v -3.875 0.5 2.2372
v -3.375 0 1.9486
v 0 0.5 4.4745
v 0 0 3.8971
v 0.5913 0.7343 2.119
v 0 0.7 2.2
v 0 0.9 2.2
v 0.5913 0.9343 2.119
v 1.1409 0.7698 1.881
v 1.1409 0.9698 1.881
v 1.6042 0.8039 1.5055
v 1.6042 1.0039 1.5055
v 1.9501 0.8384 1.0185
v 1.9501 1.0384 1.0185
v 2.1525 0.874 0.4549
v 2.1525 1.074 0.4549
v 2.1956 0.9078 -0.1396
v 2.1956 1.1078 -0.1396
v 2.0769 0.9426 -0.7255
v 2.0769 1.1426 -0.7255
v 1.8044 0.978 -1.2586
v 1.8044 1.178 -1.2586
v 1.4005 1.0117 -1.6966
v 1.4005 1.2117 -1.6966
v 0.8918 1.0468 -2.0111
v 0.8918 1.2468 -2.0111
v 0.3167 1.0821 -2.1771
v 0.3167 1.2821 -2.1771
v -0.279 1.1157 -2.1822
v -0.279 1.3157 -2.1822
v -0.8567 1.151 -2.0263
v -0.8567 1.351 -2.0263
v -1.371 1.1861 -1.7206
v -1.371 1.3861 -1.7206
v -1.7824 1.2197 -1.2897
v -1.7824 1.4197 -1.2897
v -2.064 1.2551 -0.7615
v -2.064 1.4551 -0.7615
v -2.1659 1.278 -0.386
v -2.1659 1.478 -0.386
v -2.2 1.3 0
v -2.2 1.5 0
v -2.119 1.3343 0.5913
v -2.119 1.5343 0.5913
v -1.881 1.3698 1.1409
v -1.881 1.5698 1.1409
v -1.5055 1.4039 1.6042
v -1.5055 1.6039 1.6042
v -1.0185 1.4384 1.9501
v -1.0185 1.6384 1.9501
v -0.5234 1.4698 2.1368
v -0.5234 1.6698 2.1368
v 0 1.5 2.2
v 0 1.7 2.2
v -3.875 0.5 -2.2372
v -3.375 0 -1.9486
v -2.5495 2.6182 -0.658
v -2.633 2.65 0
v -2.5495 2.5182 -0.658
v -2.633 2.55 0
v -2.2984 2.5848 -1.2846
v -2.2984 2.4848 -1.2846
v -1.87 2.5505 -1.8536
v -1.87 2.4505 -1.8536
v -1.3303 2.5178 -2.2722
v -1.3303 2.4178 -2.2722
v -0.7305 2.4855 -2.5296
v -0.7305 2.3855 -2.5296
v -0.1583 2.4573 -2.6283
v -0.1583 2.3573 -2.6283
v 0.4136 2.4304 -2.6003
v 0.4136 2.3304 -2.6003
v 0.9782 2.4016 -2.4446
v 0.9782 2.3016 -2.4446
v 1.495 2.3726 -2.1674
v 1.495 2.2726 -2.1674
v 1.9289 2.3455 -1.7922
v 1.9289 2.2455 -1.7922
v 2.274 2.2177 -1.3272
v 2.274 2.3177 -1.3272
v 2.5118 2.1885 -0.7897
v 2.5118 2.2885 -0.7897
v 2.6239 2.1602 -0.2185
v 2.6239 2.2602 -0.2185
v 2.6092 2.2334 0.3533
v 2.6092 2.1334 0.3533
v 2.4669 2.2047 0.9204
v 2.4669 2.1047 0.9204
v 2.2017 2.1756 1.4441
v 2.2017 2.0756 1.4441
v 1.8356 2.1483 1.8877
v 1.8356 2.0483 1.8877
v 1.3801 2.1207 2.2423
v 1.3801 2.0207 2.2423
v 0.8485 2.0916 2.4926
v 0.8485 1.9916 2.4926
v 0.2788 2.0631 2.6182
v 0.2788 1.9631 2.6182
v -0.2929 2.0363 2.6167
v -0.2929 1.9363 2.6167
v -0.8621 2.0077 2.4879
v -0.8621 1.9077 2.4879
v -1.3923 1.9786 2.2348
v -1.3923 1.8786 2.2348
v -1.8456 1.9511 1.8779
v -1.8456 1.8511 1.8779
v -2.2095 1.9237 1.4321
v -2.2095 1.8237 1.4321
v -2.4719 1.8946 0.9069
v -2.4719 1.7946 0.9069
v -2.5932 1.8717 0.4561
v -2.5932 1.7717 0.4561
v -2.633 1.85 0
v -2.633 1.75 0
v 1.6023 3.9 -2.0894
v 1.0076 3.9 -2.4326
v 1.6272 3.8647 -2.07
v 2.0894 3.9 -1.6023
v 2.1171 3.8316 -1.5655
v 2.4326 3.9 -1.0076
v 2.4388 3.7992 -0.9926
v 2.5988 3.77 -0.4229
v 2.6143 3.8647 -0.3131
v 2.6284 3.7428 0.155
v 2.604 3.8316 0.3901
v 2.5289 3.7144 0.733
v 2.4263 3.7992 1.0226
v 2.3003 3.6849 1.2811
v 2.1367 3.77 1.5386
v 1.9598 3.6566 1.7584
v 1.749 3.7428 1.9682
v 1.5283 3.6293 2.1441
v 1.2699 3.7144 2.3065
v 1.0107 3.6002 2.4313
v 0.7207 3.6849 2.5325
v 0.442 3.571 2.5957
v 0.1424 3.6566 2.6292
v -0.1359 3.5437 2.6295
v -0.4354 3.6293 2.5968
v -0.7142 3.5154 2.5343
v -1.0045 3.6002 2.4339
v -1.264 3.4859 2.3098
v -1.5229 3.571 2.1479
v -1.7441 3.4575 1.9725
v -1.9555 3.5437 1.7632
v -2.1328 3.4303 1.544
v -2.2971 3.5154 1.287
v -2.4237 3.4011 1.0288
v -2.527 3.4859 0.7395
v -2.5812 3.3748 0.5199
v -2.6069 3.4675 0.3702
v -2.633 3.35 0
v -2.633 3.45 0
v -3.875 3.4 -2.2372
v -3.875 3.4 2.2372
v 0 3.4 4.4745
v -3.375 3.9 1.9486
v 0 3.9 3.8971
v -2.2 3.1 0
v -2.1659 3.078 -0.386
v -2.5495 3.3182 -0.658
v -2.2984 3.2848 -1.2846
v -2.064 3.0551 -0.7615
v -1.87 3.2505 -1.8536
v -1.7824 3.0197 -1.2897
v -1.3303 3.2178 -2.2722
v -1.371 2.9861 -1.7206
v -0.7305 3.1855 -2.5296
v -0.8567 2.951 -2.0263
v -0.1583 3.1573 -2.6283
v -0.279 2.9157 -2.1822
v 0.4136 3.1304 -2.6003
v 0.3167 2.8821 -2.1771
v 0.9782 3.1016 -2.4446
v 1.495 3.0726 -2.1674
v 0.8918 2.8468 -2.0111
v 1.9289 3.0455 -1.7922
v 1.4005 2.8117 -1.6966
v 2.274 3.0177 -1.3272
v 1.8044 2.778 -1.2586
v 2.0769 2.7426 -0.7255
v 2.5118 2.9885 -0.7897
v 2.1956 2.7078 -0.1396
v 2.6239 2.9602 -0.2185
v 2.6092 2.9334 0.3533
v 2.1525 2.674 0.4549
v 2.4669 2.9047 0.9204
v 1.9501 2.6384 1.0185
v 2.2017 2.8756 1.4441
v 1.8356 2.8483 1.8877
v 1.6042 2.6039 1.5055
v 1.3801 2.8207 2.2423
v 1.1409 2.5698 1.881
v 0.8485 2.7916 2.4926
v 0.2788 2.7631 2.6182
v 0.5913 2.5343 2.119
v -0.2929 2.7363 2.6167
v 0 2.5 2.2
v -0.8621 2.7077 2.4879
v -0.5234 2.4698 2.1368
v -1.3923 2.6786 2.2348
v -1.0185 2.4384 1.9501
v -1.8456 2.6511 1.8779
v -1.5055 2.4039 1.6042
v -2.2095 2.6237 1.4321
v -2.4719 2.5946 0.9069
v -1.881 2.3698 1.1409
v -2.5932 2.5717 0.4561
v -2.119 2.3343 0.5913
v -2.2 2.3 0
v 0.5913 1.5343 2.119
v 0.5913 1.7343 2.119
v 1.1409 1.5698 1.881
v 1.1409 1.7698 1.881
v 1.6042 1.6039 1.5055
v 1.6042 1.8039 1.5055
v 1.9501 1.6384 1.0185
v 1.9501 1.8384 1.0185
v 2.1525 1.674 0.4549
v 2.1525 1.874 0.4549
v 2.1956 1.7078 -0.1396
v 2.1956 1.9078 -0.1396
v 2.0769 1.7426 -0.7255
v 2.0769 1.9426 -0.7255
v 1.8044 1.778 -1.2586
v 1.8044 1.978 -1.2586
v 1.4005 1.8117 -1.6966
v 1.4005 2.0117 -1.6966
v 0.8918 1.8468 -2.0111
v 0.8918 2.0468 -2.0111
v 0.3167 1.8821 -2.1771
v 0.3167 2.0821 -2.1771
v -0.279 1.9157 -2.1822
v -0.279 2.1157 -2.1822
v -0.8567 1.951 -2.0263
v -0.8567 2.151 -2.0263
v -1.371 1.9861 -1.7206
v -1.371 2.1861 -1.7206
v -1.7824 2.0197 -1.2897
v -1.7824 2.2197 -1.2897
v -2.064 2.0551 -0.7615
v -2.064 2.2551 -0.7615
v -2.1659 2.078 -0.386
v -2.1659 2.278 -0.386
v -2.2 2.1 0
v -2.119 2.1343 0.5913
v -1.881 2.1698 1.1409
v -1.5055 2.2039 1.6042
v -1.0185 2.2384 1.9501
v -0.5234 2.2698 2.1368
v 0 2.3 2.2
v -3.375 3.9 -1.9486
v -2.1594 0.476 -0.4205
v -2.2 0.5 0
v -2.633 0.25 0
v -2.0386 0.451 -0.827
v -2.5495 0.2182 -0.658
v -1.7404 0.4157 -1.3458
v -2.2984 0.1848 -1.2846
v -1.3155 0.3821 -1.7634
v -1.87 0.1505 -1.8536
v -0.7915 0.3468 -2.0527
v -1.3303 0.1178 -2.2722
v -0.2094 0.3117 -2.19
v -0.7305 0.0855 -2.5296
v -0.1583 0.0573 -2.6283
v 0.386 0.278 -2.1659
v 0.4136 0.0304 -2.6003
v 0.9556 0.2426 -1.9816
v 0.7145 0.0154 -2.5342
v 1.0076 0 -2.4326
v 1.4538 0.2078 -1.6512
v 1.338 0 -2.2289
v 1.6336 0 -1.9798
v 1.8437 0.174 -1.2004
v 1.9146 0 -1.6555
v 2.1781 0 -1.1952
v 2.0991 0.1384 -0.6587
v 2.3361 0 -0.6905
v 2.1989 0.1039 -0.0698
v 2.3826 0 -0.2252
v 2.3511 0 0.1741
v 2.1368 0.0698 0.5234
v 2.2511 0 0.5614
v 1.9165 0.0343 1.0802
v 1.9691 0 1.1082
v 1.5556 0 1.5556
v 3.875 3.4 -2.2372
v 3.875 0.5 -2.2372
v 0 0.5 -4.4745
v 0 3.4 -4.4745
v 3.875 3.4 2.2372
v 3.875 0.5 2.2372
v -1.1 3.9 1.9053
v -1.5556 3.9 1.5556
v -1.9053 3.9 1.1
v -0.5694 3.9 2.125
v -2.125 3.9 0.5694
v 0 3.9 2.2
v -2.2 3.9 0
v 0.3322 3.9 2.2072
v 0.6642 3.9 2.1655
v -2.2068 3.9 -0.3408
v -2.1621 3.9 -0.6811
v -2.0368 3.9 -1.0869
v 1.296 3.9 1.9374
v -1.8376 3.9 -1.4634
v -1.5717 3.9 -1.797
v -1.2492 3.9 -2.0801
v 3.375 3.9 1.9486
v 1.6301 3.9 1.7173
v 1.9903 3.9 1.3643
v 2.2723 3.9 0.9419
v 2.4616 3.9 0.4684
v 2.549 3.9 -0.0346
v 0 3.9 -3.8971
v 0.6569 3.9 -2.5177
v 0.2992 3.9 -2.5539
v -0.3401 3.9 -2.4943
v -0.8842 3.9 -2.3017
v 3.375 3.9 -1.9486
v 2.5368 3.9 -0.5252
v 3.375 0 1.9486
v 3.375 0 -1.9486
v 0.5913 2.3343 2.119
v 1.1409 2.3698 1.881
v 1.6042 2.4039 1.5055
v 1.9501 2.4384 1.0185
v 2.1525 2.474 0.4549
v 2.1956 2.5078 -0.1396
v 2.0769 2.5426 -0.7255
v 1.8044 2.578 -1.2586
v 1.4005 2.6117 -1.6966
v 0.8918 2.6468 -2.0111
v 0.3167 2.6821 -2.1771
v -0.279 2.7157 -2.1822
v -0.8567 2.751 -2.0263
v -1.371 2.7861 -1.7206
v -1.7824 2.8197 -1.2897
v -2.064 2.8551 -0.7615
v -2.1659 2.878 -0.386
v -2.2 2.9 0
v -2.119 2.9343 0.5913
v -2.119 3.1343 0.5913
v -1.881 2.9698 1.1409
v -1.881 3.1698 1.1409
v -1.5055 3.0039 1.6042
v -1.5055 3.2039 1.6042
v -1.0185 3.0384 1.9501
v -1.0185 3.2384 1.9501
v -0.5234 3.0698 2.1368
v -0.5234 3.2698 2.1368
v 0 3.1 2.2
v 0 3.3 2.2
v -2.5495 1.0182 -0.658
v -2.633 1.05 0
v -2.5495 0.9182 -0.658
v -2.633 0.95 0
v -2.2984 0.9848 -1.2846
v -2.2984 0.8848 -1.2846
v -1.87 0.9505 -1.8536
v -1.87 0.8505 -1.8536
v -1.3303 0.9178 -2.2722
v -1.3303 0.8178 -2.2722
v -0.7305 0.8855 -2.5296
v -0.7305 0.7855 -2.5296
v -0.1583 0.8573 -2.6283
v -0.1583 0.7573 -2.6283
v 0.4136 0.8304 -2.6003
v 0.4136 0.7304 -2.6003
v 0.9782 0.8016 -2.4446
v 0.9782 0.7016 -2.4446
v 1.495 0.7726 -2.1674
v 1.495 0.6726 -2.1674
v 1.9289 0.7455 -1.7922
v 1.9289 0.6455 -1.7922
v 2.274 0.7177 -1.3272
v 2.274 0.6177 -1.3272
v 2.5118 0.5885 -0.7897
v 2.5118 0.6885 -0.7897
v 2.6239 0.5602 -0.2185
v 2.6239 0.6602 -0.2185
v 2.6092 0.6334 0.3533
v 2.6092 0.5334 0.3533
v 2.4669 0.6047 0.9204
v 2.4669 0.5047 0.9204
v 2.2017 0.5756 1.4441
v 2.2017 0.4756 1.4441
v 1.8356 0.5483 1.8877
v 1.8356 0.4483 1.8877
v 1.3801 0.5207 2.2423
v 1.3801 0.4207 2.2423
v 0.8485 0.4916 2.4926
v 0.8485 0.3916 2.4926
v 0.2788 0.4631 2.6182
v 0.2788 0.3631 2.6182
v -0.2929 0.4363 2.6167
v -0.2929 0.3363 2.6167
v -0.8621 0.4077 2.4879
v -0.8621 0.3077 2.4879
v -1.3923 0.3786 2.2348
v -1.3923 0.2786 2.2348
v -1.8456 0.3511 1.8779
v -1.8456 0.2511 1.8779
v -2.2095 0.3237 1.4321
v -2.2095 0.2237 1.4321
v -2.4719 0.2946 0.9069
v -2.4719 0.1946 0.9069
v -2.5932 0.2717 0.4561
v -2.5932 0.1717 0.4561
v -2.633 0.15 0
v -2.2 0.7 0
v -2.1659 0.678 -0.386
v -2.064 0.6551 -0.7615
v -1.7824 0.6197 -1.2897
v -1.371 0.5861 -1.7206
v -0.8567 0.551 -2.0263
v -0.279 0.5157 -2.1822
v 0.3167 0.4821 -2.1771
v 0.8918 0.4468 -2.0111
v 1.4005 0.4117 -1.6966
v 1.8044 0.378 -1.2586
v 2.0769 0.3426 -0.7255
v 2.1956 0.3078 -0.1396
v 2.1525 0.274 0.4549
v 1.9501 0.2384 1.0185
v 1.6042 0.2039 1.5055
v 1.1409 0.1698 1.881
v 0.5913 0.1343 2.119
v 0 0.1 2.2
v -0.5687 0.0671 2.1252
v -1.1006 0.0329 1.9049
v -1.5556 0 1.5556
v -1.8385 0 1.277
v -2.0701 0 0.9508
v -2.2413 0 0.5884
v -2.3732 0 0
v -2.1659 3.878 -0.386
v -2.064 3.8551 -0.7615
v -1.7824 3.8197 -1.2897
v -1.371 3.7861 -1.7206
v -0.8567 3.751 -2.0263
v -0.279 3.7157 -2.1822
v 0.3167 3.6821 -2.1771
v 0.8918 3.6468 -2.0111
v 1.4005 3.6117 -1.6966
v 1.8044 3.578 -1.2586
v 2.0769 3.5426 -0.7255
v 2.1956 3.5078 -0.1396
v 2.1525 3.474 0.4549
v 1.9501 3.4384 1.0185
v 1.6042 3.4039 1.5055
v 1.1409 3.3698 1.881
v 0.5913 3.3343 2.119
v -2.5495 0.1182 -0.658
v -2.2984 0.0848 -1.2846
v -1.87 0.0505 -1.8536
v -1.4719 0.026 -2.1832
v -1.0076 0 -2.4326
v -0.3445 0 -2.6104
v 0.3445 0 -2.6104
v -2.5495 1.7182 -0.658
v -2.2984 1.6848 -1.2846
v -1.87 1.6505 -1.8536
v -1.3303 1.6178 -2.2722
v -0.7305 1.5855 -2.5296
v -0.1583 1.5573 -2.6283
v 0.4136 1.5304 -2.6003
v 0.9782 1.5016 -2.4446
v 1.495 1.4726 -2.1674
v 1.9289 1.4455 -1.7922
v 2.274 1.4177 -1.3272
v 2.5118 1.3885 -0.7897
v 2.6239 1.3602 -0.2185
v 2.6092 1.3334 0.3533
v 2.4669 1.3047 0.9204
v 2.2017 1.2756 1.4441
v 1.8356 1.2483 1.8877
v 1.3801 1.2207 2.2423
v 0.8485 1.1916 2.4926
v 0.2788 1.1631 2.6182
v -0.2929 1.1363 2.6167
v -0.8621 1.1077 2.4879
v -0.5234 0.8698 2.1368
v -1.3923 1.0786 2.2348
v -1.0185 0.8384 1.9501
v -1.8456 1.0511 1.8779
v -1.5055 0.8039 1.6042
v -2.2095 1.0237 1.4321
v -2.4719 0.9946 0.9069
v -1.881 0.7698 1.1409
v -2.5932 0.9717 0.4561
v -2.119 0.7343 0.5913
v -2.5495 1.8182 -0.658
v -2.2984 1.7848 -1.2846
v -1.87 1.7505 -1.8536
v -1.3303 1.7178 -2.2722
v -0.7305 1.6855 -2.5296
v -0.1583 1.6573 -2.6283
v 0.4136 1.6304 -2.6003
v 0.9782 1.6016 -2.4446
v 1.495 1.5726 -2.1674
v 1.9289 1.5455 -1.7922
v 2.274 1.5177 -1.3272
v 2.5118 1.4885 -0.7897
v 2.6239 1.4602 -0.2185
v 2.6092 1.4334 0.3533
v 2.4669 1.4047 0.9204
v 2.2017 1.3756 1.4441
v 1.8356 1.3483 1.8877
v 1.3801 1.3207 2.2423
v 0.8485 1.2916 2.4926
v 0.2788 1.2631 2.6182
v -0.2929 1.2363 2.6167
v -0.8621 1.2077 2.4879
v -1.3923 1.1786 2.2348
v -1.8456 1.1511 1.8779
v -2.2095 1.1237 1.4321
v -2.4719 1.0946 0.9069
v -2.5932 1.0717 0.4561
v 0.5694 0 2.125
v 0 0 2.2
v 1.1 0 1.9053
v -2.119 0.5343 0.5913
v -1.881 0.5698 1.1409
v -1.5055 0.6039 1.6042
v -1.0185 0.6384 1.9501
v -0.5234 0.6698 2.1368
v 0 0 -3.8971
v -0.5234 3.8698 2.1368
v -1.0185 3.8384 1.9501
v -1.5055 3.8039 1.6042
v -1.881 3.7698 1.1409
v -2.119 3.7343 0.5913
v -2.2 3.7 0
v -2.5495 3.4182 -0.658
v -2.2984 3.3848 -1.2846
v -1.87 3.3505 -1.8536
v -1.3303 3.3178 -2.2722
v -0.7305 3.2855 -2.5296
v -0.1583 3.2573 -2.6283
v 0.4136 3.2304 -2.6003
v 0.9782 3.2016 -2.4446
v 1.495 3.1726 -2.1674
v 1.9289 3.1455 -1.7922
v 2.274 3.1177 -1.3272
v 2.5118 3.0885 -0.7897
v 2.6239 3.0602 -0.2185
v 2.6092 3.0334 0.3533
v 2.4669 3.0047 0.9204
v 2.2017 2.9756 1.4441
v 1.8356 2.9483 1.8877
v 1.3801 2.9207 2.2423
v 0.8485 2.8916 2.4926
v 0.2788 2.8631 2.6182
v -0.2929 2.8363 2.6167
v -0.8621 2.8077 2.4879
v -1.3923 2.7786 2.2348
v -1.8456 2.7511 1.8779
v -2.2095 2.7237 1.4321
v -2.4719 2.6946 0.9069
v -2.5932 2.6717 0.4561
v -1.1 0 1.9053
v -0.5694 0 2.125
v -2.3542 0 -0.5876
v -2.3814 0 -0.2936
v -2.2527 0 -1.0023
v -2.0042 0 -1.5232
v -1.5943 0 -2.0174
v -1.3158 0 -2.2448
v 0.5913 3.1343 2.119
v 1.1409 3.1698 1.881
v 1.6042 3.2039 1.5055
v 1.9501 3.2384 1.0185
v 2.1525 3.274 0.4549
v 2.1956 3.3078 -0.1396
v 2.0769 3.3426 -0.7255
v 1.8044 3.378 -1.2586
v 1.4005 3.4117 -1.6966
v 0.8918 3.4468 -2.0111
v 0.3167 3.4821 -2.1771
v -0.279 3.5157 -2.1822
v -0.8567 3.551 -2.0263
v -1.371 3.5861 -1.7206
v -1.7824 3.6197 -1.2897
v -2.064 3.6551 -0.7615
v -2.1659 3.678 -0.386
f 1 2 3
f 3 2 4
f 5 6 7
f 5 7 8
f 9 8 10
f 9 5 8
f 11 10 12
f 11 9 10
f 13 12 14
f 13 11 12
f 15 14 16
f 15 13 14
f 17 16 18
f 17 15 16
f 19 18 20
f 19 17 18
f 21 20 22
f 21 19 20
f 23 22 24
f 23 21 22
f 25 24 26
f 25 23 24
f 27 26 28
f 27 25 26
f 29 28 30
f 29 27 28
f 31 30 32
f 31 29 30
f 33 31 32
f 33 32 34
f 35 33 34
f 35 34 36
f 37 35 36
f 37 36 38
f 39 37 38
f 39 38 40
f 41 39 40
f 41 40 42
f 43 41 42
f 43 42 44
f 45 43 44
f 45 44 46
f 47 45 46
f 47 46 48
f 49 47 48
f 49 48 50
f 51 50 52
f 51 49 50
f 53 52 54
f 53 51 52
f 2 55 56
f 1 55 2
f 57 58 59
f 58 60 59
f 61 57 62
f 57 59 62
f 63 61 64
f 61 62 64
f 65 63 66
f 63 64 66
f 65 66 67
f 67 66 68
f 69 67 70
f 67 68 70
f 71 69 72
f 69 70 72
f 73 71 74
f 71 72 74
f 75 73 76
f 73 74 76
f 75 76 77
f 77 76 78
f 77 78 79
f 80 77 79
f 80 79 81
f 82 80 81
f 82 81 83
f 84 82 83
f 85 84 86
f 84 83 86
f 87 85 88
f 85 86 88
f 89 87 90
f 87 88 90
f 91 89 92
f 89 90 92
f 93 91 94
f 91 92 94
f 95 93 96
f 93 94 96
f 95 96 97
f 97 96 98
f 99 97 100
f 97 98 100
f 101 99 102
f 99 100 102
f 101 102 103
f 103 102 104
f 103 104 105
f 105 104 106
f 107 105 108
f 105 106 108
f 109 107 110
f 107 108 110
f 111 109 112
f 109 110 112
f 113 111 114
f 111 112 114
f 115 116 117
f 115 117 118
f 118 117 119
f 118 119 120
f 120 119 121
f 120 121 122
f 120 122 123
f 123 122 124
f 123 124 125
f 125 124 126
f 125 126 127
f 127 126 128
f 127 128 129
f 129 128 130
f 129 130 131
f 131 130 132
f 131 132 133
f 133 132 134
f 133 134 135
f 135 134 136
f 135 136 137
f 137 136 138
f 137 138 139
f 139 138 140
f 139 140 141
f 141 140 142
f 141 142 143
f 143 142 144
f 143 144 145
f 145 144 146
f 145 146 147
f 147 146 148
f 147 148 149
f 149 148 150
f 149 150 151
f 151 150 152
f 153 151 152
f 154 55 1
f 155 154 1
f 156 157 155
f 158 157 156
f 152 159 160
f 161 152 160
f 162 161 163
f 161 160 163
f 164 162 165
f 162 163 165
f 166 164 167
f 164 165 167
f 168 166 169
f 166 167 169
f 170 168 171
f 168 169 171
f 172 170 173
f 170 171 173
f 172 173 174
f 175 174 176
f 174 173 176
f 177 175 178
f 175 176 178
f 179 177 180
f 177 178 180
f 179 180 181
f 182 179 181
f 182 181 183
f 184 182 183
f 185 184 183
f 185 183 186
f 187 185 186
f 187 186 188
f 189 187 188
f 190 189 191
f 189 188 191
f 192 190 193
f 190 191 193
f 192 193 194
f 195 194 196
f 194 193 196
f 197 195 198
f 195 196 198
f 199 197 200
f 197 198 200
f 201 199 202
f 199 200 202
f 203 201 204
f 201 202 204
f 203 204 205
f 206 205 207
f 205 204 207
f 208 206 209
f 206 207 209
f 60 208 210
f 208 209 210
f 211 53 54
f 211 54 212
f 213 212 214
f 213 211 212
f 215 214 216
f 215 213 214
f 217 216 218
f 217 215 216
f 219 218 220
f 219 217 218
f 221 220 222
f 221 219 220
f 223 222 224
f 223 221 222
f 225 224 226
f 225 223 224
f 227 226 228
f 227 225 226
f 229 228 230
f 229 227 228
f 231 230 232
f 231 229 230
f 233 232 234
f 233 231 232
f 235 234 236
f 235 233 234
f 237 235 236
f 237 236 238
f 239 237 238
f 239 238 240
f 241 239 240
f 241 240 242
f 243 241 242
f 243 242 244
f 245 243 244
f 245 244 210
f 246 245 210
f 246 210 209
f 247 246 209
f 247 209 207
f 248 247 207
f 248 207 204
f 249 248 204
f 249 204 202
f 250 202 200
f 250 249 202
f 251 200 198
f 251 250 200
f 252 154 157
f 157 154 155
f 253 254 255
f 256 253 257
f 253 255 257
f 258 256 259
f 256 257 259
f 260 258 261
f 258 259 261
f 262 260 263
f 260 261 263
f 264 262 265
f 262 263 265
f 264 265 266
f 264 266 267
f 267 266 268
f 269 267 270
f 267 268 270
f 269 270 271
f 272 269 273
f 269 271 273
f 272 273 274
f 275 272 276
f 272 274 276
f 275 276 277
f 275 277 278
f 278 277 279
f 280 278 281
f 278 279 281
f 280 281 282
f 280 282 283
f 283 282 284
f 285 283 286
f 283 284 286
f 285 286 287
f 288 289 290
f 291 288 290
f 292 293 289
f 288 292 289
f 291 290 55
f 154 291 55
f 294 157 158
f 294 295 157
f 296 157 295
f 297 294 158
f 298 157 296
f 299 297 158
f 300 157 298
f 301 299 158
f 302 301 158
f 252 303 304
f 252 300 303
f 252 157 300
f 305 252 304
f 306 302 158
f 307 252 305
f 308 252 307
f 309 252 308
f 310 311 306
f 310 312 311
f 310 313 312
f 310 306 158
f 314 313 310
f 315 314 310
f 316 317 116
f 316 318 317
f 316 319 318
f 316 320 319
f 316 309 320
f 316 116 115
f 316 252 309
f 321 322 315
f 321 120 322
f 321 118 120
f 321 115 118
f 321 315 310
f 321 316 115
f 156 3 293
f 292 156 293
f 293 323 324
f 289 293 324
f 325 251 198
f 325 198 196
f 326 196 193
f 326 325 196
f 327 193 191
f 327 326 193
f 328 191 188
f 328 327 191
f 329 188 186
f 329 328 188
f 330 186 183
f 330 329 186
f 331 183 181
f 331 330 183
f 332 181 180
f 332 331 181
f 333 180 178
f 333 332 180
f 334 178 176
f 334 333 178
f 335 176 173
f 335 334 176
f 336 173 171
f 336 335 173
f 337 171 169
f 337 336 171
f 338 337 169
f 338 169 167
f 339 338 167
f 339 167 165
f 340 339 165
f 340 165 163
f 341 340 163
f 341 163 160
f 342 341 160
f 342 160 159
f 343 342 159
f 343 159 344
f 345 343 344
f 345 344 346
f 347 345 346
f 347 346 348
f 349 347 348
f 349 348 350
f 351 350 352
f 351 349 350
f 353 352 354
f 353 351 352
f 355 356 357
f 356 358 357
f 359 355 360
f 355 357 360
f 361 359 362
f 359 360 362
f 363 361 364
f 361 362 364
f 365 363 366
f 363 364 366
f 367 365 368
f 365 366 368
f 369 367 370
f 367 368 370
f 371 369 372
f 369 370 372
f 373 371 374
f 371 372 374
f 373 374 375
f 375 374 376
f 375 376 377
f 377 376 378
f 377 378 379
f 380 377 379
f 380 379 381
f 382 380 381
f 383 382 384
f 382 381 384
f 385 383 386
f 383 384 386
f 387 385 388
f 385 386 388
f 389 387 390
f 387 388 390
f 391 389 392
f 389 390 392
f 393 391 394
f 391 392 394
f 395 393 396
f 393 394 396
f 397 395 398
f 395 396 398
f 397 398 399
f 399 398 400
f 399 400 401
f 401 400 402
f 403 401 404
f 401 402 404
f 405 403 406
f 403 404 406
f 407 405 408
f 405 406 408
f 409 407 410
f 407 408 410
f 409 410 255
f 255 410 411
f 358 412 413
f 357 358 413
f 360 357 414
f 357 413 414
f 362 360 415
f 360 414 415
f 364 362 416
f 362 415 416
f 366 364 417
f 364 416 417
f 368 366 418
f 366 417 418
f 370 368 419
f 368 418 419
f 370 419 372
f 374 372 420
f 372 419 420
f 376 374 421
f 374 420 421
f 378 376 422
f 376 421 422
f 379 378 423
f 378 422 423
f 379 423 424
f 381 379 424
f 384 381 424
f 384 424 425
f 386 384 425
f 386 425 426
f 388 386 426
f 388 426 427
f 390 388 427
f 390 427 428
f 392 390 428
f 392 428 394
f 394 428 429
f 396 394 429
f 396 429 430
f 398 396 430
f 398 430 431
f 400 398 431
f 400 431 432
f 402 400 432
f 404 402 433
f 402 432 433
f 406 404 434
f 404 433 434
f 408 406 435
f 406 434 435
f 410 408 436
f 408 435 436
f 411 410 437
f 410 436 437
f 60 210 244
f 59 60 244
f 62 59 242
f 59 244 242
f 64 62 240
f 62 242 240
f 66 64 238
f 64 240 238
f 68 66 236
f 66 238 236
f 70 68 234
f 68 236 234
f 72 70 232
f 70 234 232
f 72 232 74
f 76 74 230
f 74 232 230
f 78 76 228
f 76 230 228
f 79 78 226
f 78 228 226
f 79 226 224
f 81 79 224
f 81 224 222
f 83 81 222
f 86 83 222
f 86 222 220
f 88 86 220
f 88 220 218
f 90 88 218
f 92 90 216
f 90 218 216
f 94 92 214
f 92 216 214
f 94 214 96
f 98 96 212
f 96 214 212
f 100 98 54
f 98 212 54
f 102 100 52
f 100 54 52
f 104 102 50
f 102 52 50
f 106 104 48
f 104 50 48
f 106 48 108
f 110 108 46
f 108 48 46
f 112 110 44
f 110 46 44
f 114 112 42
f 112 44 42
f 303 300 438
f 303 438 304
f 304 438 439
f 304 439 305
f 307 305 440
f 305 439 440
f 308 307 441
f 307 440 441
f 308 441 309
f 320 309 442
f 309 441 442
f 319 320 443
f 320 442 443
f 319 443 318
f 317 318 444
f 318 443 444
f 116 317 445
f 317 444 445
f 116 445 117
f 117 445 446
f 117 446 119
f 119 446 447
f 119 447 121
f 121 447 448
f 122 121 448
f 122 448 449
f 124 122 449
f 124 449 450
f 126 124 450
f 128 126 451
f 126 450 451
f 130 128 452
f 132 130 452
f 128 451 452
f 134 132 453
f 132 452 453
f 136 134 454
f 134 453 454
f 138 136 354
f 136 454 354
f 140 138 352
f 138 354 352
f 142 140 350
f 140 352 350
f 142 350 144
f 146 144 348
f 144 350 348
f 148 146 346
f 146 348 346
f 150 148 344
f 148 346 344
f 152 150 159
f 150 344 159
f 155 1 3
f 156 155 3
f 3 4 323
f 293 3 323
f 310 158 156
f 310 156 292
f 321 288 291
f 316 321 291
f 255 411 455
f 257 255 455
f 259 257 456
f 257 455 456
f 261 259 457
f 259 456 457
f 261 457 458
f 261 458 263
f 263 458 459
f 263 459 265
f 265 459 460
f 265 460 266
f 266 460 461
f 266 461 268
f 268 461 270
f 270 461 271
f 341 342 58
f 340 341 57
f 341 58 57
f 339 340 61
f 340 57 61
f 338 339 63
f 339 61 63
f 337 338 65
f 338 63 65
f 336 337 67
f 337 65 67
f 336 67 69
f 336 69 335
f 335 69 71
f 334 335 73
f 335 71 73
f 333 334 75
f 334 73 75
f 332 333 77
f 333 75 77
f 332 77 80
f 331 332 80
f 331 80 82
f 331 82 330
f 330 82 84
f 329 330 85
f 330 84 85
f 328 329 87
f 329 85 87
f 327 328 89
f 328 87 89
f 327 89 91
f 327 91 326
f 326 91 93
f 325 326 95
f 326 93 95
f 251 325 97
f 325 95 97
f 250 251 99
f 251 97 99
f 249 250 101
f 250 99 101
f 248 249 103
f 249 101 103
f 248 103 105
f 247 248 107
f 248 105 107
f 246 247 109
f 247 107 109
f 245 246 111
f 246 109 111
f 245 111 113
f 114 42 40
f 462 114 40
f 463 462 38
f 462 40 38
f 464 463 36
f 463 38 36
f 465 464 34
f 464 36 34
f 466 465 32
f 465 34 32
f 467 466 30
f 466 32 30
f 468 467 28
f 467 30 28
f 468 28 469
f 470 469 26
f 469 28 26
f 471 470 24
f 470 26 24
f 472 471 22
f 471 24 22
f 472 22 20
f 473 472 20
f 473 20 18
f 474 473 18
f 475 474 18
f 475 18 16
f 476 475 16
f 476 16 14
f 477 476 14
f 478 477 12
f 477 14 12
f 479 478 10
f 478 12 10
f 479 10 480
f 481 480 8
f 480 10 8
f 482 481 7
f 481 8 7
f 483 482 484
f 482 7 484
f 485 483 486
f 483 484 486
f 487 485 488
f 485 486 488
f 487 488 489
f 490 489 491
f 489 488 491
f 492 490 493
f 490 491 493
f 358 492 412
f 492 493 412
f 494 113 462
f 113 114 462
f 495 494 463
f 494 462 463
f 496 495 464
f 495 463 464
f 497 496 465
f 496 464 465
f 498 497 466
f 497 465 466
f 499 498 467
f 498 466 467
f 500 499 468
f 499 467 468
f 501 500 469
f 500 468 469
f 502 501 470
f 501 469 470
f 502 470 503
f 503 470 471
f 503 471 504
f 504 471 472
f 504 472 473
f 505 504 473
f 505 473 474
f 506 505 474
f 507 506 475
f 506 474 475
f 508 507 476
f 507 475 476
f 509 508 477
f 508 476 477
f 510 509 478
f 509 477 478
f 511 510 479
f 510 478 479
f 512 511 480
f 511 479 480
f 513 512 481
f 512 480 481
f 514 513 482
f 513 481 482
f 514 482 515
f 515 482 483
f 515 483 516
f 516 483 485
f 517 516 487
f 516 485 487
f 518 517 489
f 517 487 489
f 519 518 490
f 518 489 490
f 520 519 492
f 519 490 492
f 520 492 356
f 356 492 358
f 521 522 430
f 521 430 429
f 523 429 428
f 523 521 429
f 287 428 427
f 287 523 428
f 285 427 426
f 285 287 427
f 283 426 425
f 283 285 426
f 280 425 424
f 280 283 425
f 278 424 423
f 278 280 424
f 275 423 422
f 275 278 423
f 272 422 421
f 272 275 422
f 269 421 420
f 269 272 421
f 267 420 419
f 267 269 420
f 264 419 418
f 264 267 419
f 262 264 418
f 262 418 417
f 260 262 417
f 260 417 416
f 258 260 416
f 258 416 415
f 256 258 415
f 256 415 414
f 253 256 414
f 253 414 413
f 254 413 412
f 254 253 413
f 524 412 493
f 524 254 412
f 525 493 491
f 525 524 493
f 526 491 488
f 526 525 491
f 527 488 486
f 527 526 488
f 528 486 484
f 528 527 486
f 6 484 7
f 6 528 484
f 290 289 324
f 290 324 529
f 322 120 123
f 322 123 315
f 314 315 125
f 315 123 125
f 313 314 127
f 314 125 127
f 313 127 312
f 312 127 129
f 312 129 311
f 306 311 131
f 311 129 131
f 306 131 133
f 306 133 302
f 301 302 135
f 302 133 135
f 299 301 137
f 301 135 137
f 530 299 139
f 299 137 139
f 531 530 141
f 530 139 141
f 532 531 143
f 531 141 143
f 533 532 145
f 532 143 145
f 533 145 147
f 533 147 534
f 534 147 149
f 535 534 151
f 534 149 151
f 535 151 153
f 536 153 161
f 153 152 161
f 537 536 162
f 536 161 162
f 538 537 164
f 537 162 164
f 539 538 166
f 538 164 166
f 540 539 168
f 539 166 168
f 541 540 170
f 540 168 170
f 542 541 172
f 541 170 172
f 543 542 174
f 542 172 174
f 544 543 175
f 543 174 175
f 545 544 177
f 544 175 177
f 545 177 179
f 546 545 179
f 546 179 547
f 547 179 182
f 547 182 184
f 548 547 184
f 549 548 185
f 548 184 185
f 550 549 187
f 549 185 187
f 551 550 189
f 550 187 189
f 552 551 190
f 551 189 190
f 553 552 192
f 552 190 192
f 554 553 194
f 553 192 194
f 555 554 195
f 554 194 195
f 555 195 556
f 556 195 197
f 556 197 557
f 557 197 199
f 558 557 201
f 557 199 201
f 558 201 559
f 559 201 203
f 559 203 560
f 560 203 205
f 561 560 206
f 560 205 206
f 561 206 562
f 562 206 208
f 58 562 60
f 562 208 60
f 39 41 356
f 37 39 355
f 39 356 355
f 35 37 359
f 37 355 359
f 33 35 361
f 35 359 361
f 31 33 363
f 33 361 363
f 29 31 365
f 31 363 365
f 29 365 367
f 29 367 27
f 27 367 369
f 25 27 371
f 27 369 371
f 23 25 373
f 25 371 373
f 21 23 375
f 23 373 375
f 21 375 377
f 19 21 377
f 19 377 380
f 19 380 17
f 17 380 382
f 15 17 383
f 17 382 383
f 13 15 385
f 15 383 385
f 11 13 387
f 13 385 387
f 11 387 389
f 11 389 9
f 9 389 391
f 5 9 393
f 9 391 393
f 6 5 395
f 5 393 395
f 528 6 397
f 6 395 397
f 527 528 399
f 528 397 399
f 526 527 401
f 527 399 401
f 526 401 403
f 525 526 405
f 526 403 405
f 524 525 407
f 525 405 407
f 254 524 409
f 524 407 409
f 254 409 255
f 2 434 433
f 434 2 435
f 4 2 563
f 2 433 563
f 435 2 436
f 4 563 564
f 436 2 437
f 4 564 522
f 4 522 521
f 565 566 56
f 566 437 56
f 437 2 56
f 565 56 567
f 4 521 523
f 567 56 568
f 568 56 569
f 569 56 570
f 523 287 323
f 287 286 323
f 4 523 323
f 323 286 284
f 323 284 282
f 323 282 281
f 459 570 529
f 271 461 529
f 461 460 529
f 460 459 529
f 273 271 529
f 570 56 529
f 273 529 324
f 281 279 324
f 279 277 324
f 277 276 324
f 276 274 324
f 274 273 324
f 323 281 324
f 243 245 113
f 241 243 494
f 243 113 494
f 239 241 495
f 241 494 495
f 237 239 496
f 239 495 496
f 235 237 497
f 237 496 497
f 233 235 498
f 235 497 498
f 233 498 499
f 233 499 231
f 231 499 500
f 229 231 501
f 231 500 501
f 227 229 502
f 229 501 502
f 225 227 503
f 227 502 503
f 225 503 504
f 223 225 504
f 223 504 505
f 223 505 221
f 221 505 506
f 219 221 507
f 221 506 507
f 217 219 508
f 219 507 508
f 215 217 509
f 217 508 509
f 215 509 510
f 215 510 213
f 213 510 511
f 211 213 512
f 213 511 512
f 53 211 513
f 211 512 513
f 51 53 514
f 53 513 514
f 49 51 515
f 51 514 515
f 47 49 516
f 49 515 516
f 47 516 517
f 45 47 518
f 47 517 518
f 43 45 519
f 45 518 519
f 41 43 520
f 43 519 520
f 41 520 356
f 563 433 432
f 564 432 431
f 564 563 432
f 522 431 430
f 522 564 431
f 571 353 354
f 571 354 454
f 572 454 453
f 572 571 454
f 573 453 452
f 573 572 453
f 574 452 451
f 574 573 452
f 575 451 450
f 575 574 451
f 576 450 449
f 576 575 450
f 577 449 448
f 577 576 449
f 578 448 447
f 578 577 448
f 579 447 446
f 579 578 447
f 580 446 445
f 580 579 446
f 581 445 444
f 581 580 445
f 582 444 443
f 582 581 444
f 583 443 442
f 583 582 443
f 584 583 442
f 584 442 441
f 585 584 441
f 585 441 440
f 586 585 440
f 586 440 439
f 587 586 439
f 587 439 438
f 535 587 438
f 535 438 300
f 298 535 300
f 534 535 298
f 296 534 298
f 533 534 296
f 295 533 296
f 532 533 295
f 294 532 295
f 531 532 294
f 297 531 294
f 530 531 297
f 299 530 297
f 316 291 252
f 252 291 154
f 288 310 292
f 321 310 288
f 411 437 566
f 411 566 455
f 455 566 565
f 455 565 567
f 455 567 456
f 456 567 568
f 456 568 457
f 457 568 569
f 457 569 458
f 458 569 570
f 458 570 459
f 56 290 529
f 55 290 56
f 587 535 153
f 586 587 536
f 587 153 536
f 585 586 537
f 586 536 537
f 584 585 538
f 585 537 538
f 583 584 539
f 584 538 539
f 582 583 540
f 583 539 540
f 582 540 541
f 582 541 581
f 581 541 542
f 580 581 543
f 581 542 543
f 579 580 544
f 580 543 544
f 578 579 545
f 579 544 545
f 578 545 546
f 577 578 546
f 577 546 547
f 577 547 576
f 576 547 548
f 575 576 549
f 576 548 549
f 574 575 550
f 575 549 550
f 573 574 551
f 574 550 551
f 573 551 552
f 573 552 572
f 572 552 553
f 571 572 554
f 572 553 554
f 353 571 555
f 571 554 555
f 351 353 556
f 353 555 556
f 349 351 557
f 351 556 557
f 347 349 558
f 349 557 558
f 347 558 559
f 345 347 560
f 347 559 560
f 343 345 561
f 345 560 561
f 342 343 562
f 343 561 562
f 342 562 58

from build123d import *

# Parameters (mm, degrees)
SKETCH1_R           = 2.2
BOSS_EXTRUDE1_DEPTH = 3.9
THREAD1_PITCH       = 0.8
CHAMFER1_SIZE       = 0.5


with BuildPart() as part:
    # Sketch1 → Boss-Extrude1 (new body)
    with BuildSketch(Plane(origin=(0, 0, 0), x_dir=(1, 0, 0), z_dir=(0, 1, 0))):
        Polygon((0, -4.474464586), (3.875, -2.237232293), (3.875, 2.237232293), (0, 4.474464586), (-3.875, 2.237232293), (-3.875, -2.237232293), align=None)
        with Locations(Location((0, 0, 0), (0, 0, 270))):
            Circle(SKETCH1_R, mode=Mode.SUBTRACT)
    extrude(amount=BOSS_EXTRUDE1_DEPTH)

    # Thread1: the profile of Thread Profile1 profile screwed along a right-hand helix of 5.625 turns, 8 arcs to a turn; built about Z, then put on its axis
    thread1_z = Axis((0, 0, 0), (0, 0, 1))
    thread1_corners = [(2.1997, 0, -0.000173205), (2.6330127, 0, 0.249999999), (2.6330127, 0, 0.349999999), (2.1997, 0, 0.600173203)]
    with BuildLine(mode=Mode.PRIVATE) as thread1_profile:
        Line(thread1_corners[0], thread1_corners[1])
        Line(thread1_corners[1], thread1_corners[2])
        Line(thread1_corners[2], thread1_corners[3])
        Line(thread1_corners[3], thread1_corners[0])
    thread1_cap = Face(thread1_profile.wire())
    thread1_turn_angles = [0, 22.5, 45, 67.5, 90, 112.5, 135, 157.5, 180, 202.5, 225, 247.5, 270, 292.5, 315, 337.5, 360]
    thread1_turn_weights = [1, 0.9238795325112867, 1, 0.9238795325112867, 1, 0.9238795325112867, 1, 0.9238795325112867, 1, 0.9238795325112867, 1, 0.9238795325112867, 1, 0.9238795325112867, 1, 0.9238795325112867, 1]
    thread1_turn_rails = [Edge.make_bspline([Vector(p[0], p[1], 0).rotate(thread1_z, thread1_turn_angles[k]) / thread1_turn_weights[k] + Vector(0, 0, p[2] + THREAD1_PITCH * thread1_turn_angles[k] / 360) for k in range(17)], [0, 0, 0, 1, 1, 2, 2, 3, 3, 4, 4, 5, 5, 6, 6, 7, 7, 8, 8, 8], 2, thread1_turn_weights) for p in thread1_corners]
    thread1_turn_sides = [Face.make_surface_from_curves(thread1_turn_rails[p[0]], thread1_turn_rails[p[1]]) for p in [(0, 1), (1, 2), (2, 3), (3, 0)]]
    thread1_last_angles = [1800, 1822.5, 1845, 1867.5, 1890, 1912.5, 1935, 1957.5, 1980, 2002.5, 2025]
    thread1_last_weights = [1, 0.9238795325112867, 1, 0.9238795325112867, 1, 0.9238795325112867, 1, 0.9238795325112867, 1, 0.9238795325112867, 1]
    thread1_last_rails = [Edge.make_bspline([Vector(p[0], p[1], 0).rotate(thread1_z, thread1_last_angles[k]) / thread1_last_weights[k] + Vector(0, 0, p[2] + THREAD1_PITCH * thread1_last_angles[k] / 360) for k in range(11)], [0, 0, 0, 1, 1, 2, 2, 3, 3, 4, 4, 5, 5, 5], 2, thread1_last_weights) for p in thread1_corners]
    thread1_last_sides = [Face.make_surface_from_curves(thread1_last_rails[p[0]], thread1_last_rails[p[1]]) for p in [(0, 1), (1, 2), (2, 3), (3, 0)]]
    thread1 = Plane(origin=(0, 4.5, 0), x_dir=(-1, 0, 0), z_dir=(0, -1, 0)) * Solid(Shell([*[p.moved(Location((0, 0, THREAD1_PITCH * i))) for i in range(5) for p in thread1_turn_sides], *thread1_last_sides, thread1_cap, thread1_cap.rotate(thread1_z, 2025).moved(Location((0, 0, THREAD1_PITCH * 2025 / 360)))]))
    add(thread1, mode=Mode.SUBTRACT)

    # Chamfer1
    chamfer1_edges = [part.edges().sort_by_distance(p)[0] for p in [
        (3.875, 3.9, 0),
        (1.9375, 3.9, -3.35584844),
        (-1.9375, 3.9, -3.35584844),
        (-3.875, 3.9, 0),
        (-1.9375, 3.9, 3.35584844),
        (-3.875, 0, 0),
        (-1.9375, 0, -3.35584844),
        (1.9375, 0, -3.35584844),
        (1.9375, 3.9, 3.35584844),
        (3.875, 0, 0),
        (1.9375, 0, 3.35584844),
        (-1.9375, 0, 3.35584844),
    ]]
    chamfer(chamfer1_edges, length=CHAMFER1_SIZE)


solid = part.part
